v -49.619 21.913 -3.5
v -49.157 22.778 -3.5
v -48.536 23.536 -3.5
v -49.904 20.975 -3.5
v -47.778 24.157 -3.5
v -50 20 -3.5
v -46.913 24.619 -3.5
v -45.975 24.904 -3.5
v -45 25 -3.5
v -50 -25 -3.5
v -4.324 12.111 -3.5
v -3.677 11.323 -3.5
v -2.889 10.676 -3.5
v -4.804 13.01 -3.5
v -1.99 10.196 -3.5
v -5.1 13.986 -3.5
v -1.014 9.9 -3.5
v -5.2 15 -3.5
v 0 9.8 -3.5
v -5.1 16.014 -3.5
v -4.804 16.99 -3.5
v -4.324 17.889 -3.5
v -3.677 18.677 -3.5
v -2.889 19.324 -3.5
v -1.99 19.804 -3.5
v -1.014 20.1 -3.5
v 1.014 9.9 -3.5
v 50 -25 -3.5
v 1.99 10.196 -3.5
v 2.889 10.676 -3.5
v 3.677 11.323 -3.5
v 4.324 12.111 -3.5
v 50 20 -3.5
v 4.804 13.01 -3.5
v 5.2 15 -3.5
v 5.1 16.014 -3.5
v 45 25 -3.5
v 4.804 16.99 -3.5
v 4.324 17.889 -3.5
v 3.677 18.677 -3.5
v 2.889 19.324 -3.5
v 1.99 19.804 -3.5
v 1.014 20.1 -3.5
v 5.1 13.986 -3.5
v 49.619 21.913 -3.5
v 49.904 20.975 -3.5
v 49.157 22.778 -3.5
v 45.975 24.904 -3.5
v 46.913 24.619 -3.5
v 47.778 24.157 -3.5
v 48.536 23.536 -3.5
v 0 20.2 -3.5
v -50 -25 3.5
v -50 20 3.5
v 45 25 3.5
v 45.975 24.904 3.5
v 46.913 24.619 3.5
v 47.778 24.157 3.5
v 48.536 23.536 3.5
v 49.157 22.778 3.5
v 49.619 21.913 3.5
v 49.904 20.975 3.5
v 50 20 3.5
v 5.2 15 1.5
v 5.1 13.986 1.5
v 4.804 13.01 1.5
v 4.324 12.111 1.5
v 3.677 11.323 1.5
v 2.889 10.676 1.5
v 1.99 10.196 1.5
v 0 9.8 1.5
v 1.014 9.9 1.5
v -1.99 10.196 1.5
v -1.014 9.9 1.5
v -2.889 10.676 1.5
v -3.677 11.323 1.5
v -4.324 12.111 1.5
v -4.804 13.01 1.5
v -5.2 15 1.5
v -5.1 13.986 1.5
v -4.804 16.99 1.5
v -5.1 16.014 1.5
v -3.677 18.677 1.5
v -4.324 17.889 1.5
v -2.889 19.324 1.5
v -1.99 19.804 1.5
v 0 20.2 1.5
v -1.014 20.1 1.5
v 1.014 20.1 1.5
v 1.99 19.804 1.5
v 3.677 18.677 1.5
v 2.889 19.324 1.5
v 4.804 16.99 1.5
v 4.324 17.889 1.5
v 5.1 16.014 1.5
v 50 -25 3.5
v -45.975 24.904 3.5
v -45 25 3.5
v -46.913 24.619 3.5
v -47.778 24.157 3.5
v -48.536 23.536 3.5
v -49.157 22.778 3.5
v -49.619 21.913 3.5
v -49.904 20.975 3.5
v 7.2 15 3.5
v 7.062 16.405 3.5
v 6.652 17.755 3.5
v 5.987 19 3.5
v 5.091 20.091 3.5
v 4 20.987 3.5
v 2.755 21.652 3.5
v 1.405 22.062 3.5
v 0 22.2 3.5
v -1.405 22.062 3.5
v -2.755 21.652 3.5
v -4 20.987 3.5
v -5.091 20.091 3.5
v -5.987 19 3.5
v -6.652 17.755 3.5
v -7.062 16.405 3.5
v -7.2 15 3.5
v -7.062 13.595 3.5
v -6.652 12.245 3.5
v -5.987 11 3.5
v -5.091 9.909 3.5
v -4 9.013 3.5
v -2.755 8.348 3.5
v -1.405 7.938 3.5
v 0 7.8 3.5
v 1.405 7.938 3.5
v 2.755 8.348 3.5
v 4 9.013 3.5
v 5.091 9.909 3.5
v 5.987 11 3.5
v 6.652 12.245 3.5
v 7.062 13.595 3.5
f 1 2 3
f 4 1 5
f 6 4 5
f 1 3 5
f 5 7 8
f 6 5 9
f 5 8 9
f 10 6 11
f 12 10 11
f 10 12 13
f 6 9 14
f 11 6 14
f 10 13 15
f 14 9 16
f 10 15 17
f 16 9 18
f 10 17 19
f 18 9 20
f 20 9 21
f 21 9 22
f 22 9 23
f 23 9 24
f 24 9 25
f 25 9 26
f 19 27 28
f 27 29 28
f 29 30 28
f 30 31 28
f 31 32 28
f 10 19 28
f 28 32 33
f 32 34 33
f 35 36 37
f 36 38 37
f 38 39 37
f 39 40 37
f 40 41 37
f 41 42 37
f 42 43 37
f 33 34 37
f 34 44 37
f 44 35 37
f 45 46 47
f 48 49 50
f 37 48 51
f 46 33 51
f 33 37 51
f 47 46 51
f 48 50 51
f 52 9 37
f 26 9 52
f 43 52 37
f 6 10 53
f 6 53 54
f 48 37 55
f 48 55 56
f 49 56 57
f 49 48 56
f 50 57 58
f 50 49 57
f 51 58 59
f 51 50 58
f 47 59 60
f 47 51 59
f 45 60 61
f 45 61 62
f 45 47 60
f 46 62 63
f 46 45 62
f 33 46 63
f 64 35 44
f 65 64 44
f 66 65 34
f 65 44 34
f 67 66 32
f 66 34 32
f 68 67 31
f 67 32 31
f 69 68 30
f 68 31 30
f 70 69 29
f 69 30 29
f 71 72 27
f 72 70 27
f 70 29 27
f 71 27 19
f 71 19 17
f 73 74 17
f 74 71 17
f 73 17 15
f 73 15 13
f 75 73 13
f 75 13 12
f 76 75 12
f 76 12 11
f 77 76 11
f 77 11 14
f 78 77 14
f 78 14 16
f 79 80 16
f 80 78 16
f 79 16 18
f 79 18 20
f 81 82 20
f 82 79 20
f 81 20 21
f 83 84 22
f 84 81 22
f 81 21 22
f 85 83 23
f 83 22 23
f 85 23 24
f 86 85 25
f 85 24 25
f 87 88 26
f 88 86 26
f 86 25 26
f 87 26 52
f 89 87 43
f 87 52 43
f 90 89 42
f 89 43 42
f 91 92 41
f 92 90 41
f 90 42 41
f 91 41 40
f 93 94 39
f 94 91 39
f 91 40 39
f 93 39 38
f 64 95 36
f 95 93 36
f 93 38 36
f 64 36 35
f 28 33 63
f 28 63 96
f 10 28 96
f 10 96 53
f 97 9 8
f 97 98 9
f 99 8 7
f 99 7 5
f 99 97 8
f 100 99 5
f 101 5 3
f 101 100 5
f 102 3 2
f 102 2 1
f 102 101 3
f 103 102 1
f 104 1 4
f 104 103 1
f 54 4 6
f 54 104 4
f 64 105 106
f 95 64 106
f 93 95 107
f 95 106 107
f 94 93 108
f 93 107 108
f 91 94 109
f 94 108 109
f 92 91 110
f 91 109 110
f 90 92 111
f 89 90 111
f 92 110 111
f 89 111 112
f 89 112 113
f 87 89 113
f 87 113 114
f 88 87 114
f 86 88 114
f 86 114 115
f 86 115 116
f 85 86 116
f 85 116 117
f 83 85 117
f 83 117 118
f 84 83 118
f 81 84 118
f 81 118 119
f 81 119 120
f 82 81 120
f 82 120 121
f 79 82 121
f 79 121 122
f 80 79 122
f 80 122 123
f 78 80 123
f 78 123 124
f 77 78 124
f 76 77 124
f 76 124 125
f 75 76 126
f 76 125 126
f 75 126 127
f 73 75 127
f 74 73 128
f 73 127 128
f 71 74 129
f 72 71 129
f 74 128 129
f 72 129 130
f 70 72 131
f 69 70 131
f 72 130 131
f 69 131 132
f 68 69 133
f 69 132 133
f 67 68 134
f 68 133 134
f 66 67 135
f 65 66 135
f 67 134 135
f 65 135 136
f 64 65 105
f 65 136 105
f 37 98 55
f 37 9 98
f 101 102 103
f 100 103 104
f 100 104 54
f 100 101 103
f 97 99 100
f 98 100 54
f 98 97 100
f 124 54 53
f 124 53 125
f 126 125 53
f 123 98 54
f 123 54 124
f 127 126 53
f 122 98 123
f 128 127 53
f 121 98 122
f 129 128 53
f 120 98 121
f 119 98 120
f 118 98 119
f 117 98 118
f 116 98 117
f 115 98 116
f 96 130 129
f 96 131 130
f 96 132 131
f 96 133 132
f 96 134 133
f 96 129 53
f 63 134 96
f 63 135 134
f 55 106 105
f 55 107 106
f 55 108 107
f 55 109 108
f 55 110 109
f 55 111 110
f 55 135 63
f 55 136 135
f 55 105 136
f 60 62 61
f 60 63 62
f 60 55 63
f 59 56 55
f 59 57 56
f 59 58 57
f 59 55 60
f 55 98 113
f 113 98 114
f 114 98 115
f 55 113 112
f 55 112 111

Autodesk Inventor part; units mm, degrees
sketch "Sketch1" plane through (0, 0, 0) normal (0, 0, 1) x (1, 0, 0)
  line L0 (-50, 25) -> (50, 25)
  line L1 (50, 25) -> (50, -25)
  line L2 (50, -25) -> (-50, -25)
  line L3 (-50, -25) -> (-50, 25)
  line L4 (-50, 25) -> (50, -25) construction
  line L5 (50, 25) -> (-50, -25) construction
  circle A0 centre (0, 15) radius 5.2
  circle A1 centre (0, 15) radius 5 projected
  point P0 (0, 0)
  point P1 (0, 0)
  dimension "d0" = 100
  dimension "d1" = 50
  dimension "d2" = 15
  dimension "d7" = 10.4
extrude "Extrusion1" add sketch "Sketch1" along normal mid plane 7 contours L0 L1 L2 L3
fillet "Fillet1" radius 5 2 edges at (50, 25, 0) (-50, 25, 0)
chamfer "Chamfer1" distance 2 angle 45 1 edges at (-5.2, 15, 3.5)
properties part number "sessao_07_04_003_001"
